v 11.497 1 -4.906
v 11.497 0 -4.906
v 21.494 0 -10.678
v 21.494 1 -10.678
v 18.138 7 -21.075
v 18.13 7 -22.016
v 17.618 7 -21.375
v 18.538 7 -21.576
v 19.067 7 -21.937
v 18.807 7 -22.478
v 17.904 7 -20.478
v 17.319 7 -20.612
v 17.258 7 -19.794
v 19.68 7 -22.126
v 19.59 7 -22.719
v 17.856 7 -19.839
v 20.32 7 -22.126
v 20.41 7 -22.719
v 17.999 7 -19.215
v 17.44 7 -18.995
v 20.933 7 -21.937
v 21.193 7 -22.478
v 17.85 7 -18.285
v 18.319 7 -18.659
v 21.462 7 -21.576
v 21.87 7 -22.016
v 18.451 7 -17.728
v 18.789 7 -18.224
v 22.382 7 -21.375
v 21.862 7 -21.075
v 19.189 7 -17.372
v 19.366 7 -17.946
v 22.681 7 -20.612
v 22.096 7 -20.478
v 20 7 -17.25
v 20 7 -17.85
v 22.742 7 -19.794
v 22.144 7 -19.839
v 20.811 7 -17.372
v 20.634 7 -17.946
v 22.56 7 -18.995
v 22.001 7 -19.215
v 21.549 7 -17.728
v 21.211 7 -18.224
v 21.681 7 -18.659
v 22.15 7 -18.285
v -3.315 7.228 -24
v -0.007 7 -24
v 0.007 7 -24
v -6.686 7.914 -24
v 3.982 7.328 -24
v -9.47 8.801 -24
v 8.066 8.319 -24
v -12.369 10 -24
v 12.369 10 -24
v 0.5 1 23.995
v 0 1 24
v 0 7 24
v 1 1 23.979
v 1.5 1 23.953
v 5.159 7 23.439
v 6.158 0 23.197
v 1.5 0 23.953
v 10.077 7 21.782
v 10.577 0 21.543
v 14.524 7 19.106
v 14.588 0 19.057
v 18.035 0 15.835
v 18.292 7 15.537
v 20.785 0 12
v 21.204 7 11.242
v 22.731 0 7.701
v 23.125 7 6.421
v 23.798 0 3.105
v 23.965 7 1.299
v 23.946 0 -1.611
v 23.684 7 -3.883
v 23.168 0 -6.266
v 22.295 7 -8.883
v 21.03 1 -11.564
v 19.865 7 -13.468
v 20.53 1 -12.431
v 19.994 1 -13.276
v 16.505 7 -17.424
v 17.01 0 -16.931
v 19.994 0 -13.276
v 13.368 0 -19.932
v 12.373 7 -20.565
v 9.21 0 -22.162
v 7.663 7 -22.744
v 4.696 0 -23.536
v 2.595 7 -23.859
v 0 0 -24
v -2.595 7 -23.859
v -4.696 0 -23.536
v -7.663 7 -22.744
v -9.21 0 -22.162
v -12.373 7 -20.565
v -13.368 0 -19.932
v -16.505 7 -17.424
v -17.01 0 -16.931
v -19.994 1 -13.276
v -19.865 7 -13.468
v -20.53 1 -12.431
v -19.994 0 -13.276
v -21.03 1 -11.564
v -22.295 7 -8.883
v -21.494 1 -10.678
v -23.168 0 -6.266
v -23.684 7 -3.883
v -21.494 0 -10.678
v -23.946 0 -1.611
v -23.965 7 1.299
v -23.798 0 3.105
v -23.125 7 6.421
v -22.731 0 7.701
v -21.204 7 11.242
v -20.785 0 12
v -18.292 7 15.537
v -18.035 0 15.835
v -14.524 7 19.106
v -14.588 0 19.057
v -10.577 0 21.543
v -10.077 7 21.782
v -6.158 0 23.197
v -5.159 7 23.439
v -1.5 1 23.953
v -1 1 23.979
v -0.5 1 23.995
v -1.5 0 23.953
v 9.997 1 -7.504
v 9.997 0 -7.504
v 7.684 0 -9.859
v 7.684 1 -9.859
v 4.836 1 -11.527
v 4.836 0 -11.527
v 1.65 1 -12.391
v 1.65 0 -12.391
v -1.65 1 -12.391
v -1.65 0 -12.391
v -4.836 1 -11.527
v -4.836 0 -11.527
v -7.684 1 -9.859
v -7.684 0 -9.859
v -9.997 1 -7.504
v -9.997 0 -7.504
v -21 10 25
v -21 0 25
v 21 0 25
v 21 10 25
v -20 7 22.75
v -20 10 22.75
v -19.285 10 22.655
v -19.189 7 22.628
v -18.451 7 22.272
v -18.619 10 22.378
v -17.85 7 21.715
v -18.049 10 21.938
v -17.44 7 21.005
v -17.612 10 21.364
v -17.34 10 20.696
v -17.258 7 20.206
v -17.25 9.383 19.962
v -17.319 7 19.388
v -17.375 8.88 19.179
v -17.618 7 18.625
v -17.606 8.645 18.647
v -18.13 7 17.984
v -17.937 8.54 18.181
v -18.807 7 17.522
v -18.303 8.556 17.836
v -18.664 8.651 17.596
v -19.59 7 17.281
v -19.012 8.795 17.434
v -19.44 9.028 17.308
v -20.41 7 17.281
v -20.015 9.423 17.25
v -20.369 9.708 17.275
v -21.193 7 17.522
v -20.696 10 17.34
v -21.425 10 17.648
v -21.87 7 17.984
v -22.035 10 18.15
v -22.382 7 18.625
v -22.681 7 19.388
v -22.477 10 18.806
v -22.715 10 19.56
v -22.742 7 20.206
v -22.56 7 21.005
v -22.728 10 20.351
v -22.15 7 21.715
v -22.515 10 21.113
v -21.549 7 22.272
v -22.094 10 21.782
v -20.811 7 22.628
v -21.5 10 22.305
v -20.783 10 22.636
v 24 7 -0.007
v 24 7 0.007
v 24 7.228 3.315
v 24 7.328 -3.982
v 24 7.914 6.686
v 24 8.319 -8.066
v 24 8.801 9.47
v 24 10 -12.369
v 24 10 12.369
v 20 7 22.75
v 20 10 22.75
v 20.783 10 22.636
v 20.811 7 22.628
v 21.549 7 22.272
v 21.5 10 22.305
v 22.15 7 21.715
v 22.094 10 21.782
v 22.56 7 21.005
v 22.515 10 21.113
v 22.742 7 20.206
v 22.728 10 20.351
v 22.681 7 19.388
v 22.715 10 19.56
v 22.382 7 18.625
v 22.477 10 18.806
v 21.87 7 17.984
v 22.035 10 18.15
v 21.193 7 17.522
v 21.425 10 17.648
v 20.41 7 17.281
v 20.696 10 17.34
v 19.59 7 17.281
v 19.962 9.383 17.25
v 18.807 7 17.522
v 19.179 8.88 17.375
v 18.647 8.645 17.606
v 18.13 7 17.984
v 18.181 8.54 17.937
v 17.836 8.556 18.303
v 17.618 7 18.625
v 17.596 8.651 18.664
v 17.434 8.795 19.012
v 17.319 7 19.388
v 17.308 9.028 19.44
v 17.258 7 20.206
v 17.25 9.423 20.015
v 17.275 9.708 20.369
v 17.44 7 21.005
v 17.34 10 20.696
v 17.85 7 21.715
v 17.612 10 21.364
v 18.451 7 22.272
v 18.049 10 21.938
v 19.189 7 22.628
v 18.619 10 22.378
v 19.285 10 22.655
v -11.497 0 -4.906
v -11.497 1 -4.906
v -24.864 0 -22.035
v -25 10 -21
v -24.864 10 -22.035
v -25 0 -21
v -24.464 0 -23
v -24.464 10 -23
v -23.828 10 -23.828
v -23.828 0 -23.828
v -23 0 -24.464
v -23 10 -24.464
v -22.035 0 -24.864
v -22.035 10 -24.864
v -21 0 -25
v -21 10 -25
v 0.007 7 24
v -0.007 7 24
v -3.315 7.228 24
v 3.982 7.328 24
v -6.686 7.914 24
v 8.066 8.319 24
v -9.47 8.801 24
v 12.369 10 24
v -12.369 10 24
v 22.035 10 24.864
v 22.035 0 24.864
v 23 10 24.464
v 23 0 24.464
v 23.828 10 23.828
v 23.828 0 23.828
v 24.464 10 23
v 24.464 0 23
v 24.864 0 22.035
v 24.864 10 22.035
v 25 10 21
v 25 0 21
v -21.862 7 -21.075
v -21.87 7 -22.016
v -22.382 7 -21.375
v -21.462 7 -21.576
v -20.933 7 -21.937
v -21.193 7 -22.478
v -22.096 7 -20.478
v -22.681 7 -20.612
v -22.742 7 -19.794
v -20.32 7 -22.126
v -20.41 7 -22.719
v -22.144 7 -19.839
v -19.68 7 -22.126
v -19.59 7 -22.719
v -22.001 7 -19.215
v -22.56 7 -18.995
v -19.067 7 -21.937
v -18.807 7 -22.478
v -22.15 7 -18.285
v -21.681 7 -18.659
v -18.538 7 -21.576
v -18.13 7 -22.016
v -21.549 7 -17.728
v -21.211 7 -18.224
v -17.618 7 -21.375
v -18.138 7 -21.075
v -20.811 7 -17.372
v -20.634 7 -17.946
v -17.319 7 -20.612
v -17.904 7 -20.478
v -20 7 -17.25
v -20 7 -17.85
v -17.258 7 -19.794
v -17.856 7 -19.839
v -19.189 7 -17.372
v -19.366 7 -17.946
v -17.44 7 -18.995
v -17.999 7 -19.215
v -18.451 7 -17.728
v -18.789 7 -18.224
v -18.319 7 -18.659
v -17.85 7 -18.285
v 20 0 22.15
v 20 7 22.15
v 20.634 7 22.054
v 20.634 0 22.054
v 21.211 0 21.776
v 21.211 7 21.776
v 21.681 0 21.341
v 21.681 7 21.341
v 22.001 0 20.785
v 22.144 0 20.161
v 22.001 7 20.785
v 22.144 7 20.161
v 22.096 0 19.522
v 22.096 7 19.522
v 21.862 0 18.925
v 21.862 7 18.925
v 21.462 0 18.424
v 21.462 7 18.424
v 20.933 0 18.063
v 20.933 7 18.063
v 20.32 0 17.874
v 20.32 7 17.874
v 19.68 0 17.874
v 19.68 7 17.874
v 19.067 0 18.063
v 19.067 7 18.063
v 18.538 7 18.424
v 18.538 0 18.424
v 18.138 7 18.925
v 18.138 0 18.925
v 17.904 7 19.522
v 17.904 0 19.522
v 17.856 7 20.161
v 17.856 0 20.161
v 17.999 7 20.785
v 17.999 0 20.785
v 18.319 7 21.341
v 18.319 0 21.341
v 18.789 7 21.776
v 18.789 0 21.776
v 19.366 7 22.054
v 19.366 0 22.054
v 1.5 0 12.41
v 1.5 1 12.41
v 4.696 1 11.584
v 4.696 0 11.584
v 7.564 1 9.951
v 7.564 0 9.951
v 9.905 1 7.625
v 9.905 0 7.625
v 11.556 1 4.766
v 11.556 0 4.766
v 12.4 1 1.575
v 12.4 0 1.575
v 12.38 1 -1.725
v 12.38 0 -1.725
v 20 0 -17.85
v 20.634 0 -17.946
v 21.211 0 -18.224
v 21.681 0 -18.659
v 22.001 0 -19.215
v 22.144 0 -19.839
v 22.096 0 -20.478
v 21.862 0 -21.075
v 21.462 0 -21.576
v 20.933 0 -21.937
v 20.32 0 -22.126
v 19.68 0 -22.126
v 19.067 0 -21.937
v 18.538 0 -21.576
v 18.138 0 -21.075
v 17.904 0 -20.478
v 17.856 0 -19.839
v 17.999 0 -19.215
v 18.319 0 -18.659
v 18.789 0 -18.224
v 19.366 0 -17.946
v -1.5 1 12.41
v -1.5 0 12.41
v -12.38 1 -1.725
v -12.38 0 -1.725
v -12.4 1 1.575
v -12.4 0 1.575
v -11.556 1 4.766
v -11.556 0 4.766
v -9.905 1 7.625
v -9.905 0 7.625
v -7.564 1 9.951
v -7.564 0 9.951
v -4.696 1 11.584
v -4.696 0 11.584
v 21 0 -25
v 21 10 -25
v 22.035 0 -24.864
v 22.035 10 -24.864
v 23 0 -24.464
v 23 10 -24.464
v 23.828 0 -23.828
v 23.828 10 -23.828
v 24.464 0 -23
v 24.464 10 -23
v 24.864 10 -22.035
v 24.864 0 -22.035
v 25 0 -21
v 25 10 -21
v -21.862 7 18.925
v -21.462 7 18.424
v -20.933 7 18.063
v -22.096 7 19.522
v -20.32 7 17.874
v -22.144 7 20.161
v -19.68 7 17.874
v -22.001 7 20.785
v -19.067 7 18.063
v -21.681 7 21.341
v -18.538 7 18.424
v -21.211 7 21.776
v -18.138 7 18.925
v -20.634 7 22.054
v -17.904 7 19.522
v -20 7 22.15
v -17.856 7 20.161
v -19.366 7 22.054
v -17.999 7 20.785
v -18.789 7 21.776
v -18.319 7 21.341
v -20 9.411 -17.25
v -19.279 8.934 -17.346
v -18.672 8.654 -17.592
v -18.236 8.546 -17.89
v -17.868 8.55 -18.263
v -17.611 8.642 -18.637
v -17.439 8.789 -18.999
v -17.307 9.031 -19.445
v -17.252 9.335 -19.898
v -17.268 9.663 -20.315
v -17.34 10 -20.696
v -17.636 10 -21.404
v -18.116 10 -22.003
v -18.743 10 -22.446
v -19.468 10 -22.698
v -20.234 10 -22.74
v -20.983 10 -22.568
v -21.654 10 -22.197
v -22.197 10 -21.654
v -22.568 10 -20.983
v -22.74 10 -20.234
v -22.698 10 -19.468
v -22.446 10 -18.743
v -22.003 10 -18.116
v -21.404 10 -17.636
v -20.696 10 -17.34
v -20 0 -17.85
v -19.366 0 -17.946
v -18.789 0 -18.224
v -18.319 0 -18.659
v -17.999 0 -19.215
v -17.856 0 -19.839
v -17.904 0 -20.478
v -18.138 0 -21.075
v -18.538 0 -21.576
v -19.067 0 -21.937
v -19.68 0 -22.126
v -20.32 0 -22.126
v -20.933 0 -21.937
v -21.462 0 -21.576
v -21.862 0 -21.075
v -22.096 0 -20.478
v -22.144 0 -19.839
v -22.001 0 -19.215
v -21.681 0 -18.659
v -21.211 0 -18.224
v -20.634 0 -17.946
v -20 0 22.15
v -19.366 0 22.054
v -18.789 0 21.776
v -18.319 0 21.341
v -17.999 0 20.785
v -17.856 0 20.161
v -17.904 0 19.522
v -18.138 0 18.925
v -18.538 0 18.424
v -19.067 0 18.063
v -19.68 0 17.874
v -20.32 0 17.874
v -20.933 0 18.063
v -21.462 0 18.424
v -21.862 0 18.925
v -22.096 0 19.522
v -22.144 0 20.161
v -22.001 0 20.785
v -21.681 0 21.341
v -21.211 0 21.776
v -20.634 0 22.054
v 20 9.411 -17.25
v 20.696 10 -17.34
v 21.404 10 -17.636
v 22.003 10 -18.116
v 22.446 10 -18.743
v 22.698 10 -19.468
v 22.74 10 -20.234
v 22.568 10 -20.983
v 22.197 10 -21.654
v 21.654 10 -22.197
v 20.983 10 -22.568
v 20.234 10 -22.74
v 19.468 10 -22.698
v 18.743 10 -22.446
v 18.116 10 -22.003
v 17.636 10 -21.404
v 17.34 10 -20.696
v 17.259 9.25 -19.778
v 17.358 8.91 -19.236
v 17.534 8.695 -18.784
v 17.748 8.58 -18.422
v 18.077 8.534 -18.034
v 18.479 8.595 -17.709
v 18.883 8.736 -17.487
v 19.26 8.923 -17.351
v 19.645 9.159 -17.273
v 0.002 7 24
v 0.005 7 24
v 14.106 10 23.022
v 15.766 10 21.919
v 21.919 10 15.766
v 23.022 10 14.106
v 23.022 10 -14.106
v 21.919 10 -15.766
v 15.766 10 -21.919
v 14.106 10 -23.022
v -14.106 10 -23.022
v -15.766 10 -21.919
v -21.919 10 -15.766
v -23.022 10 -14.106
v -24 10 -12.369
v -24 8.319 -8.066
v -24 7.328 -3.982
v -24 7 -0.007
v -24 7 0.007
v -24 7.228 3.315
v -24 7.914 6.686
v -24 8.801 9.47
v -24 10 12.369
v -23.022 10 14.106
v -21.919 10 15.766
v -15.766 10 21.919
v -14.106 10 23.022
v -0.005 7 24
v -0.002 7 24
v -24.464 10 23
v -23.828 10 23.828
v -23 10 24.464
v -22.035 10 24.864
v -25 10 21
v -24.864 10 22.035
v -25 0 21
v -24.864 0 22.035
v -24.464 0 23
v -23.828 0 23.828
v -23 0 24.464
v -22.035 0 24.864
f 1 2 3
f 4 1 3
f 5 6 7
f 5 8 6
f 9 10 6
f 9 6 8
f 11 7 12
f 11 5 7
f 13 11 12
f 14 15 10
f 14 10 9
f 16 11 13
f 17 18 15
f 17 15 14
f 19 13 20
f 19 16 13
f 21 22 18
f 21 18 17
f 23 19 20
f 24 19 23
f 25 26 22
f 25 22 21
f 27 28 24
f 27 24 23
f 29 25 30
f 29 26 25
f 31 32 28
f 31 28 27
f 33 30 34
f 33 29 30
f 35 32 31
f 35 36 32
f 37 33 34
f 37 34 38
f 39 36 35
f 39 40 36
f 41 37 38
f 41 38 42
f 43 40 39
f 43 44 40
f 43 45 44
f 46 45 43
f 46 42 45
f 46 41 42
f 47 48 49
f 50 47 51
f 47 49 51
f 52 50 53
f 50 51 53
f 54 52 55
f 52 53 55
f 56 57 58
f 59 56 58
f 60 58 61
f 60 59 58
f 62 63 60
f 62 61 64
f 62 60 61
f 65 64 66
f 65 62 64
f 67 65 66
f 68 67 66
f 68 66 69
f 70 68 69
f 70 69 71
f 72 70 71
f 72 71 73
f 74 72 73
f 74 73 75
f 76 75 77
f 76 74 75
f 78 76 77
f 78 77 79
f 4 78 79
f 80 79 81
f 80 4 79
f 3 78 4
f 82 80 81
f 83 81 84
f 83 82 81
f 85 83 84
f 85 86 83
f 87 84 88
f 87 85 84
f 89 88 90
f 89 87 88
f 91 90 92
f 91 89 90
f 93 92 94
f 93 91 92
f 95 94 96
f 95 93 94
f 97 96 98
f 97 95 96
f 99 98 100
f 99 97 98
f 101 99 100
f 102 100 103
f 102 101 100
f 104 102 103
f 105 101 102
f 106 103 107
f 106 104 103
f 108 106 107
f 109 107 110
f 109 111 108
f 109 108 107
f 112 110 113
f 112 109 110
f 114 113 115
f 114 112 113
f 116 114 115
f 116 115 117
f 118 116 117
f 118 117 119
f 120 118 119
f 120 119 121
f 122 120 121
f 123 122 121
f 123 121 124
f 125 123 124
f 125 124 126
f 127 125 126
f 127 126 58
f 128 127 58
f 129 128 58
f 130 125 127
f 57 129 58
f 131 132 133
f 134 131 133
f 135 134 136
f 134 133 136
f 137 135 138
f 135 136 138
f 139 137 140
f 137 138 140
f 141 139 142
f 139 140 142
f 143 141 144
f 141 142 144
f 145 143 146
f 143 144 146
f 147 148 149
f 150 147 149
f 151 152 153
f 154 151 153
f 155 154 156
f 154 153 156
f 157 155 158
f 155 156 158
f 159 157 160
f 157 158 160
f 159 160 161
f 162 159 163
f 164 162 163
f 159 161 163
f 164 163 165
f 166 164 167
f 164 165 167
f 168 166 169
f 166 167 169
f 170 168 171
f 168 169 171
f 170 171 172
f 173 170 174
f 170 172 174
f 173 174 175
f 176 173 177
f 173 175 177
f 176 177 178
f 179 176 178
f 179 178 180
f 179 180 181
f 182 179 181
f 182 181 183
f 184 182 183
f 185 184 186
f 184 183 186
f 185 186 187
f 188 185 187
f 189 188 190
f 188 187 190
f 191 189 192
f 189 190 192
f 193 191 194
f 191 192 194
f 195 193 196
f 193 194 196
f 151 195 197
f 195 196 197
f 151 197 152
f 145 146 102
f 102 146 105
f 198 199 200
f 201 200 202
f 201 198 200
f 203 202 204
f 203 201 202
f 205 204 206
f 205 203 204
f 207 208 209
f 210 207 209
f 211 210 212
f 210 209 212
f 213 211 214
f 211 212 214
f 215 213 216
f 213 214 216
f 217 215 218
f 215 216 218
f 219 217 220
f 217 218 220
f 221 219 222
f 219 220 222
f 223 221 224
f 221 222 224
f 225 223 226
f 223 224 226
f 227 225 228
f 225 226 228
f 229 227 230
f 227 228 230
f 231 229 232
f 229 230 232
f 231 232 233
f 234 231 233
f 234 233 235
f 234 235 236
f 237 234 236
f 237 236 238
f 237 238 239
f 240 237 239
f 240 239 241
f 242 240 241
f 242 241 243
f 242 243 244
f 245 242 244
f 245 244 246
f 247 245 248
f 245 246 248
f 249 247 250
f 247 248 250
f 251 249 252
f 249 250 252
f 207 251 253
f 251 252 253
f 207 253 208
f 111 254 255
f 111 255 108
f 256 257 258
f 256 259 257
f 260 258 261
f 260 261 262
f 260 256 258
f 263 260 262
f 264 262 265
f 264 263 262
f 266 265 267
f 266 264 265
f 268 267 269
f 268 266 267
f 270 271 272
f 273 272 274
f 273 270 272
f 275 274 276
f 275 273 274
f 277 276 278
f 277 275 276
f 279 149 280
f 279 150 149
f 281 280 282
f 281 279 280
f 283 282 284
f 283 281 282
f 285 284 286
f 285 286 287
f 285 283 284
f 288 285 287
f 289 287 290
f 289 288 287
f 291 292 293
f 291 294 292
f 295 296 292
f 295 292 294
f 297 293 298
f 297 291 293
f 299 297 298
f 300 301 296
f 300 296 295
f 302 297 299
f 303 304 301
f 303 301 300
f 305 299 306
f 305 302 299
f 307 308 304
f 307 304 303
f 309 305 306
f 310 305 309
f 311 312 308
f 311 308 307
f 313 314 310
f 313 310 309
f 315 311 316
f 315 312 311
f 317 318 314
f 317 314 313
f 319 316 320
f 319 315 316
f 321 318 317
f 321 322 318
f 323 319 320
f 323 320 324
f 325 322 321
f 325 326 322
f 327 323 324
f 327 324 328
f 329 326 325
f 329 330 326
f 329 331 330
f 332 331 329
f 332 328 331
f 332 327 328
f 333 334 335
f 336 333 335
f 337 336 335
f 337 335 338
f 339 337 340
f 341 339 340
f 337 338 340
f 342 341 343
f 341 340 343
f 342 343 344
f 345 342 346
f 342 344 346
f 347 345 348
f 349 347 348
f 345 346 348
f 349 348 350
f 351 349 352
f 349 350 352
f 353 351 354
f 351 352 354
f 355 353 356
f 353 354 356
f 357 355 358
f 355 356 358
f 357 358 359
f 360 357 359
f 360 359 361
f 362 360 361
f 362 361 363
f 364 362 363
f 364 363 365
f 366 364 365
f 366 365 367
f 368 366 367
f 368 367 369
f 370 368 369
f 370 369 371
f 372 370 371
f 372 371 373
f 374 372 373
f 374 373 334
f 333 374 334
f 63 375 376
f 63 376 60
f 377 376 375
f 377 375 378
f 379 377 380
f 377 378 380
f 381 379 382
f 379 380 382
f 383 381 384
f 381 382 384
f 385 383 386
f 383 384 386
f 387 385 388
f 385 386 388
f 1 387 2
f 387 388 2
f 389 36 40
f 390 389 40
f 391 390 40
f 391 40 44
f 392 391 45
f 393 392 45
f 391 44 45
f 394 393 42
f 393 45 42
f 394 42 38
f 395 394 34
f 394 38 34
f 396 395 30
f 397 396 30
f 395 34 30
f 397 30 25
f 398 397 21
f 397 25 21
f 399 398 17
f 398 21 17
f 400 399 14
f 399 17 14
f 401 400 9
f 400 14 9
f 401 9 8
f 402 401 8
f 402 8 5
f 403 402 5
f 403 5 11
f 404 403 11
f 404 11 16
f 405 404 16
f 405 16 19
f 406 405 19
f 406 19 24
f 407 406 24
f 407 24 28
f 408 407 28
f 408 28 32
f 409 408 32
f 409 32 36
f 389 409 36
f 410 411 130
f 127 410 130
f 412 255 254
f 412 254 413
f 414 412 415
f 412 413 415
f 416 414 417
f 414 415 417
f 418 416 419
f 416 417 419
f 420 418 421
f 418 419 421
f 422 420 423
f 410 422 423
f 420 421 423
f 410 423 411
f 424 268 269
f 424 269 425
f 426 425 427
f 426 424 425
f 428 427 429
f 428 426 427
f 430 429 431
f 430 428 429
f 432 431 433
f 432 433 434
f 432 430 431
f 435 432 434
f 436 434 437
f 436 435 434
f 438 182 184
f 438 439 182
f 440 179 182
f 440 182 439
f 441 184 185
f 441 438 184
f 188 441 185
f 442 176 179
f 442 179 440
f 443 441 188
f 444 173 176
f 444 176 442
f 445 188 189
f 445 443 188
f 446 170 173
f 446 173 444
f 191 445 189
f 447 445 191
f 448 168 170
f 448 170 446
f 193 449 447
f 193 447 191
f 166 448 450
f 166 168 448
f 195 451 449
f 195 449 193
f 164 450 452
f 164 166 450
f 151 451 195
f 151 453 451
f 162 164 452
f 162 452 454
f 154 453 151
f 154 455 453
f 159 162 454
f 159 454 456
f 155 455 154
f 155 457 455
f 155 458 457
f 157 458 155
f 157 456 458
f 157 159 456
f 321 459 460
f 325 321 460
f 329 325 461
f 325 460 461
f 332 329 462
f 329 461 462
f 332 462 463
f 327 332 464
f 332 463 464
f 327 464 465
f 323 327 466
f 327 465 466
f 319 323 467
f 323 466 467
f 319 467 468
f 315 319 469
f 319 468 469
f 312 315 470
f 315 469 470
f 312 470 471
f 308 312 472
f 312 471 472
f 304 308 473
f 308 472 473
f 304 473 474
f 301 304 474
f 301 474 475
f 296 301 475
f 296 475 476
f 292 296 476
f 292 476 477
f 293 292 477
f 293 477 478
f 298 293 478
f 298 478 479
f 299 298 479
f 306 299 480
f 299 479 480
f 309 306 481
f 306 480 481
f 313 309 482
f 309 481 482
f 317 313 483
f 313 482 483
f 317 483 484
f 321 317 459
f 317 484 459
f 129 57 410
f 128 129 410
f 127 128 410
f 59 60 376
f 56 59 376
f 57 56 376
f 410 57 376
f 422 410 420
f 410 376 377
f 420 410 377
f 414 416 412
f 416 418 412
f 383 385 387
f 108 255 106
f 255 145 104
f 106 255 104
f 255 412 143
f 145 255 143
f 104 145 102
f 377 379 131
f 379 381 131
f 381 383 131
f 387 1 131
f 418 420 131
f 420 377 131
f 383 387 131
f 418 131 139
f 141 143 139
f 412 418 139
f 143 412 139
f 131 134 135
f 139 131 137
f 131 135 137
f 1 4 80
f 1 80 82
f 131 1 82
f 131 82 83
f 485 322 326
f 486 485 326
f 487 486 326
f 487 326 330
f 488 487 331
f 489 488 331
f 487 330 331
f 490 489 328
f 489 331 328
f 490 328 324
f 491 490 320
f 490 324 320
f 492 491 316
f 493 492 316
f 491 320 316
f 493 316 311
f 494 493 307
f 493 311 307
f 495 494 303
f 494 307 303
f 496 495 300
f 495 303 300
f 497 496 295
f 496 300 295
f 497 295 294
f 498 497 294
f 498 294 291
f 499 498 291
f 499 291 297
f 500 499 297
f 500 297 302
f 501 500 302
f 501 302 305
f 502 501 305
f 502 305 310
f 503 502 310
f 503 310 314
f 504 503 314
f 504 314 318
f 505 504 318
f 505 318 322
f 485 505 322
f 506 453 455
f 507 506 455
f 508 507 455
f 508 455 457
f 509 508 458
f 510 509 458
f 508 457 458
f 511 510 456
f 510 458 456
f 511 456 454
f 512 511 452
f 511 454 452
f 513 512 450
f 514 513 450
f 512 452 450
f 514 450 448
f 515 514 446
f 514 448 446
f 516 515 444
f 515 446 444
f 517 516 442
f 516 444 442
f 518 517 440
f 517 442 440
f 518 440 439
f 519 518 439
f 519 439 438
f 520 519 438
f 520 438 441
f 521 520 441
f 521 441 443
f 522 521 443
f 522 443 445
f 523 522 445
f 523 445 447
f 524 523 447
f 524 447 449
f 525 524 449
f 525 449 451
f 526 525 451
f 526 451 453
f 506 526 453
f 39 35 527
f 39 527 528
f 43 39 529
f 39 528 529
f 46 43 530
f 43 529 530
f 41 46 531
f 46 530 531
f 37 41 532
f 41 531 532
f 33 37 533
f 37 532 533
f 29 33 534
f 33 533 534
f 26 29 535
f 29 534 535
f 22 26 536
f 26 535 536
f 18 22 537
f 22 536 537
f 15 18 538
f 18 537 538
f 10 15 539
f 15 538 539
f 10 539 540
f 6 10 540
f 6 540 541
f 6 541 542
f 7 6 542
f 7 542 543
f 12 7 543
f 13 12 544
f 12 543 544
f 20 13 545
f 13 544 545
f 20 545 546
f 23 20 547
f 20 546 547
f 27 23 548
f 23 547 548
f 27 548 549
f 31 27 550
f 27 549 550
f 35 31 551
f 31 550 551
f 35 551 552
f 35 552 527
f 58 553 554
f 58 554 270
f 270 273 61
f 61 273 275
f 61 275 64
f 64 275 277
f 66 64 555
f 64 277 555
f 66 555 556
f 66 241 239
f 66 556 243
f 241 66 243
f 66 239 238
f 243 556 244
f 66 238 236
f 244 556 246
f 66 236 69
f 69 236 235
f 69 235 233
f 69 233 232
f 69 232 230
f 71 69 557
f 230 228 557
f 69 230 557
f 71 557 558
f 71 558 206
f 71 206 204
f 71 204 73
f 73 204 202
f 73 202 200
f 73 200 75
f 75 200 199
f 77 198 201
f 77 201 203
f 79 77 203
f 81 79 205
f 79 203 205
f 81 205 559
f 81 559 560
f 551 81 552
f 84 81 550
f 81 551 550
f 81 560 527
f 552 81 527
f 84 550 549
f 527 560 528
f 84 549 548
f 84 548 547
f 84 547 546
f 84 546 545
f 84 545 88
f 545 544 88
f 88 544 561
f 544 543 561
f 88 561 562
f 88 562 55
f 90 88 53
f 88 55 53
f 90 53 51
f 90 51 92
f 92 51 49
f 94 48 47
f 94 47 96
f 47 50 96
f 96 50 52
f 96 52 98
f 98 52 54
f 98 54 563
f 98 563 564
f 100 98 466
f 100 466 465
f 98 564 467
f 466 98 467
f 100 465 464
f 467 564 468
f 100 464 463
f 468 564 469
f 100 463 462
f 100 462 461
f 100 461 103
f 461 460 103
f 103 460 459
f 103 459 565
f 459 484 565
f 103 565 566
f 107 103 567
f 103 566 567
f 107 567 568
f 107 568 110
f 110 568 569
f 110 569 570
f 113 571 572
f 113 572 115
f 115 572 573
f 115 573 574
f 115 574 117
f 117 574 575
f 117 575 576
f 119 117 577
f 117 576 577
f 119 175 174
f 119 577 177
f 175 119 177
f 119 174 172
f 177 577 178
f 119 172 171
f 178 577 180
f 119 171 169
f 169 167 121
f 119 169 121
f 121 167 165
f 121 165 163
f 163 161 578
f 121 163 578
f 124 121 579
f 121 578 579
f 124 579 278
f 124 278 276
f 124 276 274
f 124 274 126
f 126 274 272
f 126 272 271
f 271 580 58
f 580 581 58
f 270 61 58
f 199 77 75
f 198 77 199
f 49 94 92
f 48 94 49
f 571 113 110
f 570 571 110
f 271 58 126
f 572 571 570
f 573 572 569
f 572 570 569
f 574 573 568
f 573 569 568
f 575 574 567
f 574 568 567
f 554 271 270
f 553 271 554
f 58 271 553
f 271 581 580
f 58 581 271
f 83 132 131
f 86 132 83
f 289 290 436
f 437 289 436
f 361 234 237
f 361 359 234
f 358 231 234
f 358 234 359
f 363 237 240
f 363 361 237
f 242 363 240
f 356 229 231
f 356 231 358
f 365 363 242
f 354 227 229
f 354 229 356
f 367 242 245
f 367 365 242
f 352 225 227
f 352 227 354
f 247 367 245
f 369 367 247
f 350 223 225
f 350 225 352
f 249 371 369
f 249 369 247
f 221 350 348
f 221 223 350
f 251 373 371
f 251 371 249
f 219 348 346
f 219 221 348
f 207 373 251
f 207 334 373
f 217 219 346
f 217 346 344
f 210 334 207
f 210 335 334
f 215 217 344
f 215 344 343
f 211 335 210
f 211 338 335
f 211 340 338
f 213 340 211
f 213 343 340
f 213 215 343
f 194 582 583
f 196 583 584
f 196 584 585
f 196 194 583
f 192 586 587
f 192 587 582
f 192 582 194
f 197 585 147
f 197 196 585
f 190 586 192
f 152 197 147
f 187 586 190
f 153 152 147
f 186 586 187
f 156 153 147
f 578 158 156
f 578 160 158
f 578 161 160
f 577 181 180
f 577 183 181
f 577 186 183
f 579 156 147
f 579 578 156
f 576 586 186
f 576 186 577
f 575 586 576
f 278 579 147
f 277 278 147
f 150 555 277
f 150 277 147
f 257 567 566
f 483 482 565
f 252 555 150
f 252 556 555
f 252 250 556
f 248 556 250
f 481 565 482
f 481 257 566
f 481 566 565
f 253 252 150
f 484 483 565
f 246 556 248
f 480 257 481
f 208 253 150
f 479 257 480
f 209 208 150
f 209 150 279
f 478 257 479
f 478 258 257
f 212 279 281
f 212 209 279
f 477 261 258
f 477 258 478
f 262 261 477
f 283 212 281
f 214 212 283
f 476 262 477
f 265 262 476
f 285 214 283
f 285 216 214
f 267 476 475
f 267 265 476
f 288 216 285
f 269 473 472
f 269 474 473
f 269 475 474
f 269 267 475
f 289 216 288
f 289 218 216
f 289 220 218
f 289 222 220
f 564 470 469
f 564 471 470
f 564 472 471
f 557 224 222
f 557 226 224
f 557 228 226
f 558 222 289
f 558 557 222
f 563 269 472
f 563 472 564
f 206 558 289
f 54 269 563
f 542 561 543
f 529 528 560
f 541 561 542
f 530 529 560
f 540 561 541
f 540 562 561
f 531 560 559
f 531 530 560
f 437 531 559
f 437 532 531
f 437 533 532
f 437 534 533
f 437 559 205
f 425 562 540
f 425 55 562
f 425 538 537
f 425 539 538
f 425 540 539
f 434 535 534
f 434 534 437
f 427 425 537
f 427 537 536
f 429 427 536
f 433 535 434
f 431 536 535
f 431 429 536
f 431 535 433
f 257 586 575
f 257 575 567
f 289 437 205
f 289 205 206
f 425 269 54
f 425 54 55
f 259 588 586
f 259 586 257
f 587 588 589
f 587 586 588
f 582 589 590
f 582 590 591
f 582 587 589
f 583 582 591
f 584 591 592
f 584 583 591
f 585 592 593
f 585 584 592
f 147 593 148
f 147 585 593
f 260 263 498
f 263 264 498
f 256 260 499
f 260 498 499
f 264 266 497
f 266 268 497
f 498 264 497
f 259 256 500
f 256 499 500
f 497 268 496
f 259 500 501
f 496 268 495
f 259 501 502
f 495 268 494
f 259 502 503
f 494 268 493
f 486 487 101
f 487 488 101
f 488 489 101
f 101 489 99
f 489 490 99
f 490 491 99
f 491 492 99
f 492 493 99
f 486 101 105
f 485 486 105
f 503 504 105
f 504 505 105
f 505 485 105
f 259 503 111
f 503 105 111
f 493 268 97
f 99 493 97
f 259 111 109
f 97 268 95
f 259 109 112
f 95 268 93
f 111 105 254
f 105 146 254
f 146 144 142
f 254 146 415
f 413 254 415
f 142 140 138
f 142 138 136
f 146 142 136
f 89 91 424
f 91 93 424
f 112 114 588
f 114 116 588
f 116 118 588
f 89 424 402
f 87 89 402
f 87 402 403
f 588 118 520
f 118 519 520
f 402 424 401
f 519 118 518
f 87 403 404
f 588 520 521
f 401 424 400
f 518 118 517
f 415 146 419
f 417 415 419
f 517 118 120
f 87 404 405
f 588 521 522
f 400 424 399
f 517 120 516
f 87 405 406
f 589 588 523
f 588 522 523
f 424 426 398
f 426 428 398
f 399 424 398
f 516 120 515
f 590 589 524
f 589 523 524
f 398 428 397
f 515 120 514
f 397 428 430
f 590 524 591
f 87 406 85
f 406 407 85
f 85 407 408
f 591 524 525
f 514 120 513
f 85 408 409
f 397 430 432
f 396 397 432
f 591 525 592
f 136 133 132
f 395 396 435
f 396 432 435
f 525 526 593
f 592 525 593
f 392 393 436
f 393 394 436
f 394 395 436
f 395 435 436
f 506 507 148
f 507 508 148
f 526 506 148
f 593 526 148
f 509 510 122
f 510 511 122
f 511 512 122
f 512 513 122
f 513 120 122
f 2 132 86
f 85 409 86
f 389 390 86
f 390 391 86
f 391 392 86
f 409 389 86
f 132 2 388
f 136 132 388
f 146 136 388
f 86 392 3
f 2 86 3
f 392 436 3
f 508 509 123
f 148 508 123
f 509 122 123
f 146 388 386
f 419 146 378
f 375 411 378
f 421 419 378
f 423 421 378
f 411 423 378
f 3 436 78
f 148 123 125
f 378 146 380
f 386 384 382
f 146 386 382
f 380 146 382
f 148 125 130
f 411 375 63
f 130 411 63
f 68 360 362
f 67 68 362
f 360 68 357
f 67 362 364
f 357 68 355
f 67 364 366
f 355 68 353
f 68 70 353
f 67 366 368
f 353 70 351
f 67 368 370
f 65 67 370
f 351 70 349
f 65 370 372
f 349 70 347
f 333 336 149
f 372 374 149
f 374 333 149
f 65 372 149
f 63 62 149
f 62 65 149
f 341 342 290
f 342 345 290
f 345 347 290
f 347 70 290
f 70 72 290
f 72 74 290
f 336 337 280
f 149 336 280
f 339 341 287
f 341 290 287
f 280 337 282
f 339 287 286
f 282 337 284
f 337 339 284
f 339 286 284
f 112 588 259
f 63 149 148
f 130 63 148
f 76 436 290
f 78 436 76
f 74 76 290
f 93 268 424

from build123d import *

# Parameters (mm, degrees)
SKETCH1_W           = 50
SKETCH1_H           = 50
SKETCH1_R           = 24
BOSS_EXTRUDE1_DEPTH = 10
CHAMFER1_SIZE       = 3
BOSS_EXTRUDE2_START = -2.999999
SKETCH4_W           = 50
SKETCH4_H           = 50
SKETCH4_W_2         = 48
SKETCH4_H_2         = 48
BOSS_EXTRUDE2_DEPTH = 2.999999
SKETCH5_R           = 2.75
CUT_EXTRUDE1_DEPTH  = 3
FILLET1_R           = 4
SKETCH6_R           = 12.5
BOSS_EXTRUDE5_DEPTH = 1
SKETCH7_R           = 2.15
CUT_EXTRUDE2_DEPTH  = 21
SKETCH9_W           = 3
SKETCH9_H           = 24
BOSS_EXTRUDE6_DEPTH = 1
CIRPATTERN1_COUNT   = 3


with BuildPart() as part:
    # Sketch1 → Boss-Extrude1 (new body)
    with BuildSketch(Plane(origin=(0, 0, 0), x_dir=(1, 0, 0), z_dir=(0, 1, 0))):
        Rectangle(SKETCH1_W, SKETCH1_H)
        with Locations(Location((0, 0, 0), (0, 0, 270))):
            Circle(SKETCH1_R, mode=Mode.SUBTRACT)
    extrude(amount=BOSS_EXTRUDE1_DEPTH)

    # Chamfer1
    # the kernel refuses this chamfer: 3 mm, written as the material it takes off along each edge
    with BuildSketch(Plane(origin=(0, 10, 0), x_dir=(0, 0, 1), z_dir=(-1, 0, 0))) as chamfer1_piece_1:
        Polygon((24, -CHAMFER1_SIZE), (24 + CHAMFER1_SIZE, 0), (24, 0), align=None)
    revolve(axis=Axis((0, 10, 0), (0, 1, 0)), mode=Mode.SUBTRACT)

    # Sketch4 → Boss-Extrude2 (add)
    with BuildSketch(Plane(origin=(0, 10, 0), x_dir=(1, 0, 0), z_dir=(0, 1, 0)).offset(BOSS_EXTRUDE2_START)):
        Rectangle(SKETCH4_W, SKETCH4_H)
        Rectangle(SKETCH4_W_2, SKETCH4_H_2, mode=Mode.SUBTRACT)
    extrude(amount=BOSS_EXTRUDE2_DEPTH)

    # Sketch5 → Cut-Extrude1 (cut)
    with BuildSketch(Plane(origin=(0, 10, 0), x_dir=(1, 0, 0), z_dir=(0, 1, 0))):
        with Locations(Location((-20, 20, 0), (0, 0, 270))):
            Circle(SKETCH5_R)
        with Locations(Location((20, 20, 0), (0, 0, 270))):
            Circle(SKETCH5_R)
        with Locations(Location((20, -20, 0), (0, 0, 270))):
            Circle(SKETCH5_R)
        with Locations(Location((-20, -20, 0), (0, 0, 270))):
            Circle(SKETCH5_R)
    extrude(amount=-CUT_EXTRUDE1_DEPTH, mode=Mode.SUBTRACT)

    # Fillet1
    fillet1_edges = [part.edges().sort_by_distance(p)[0] for p in [
        (-25, 5, -25),
        (25, 5, -25),
        (25, 5, 25),
        (-25, 5, 25),
    ]]
    fillet(fillet1_edges, radius=FILLET1_R)

    # Sketch7 → Cut-Extrude2 (cut)
    with BuildSketch(Plane(origin=(0, 7, 0), x_dir=(1, 0, 0), z_dir=(0, 1, 0))):
        with Locations(Location((-20, -20, 0), (0, 0, 270))):
            Circle(SKETCH7_R)
        with Locations(Location((-20, 20, 0), (0, 0, 270))):
            Circle(SKETCH7_R)
        with Locations(Location((20, 20, 0), (0, 0, 270))):
            Circle(SKETCH7_R)
        with Locations(Location((20, -20, 0), (0, 0, 270))):
            Circle(SKETCH7_R)
    extrude(amount=-CUT_EXTRUDE2_DEPTH, mode=Mode.SUBTRACT)



with BuildPart() as body_2:
    # Sketch6 → Boss-Extrude5 (new body)
    with BuildSketch(Plane(origin=(0, 0, 0), x_dir=(1, 0, 0), z_dir=(0, 1, 0))):
        with Locations(Location((0, 0, 0), (0, 0, 270))):
            Circle(SKETCH6_R)
    extrude(amount=BOSS_EXTRUDE5_DEPTH)


with BuildPart() as part_1:
    add(part.part)

    add(body_2.part)  # Boss-Extrude6 merges body 2
    # Sketch9 → Boss-Extrude6 (add)
    with BuildSketch(Plane.XZ):
        with Locations((0, 12.5)):
            Rectangle(SKETCH9_W, SKETCH9_H)
    boss_extrude6 = extrude(amount=-BOSS_EXTRUDE6_DEPTH)

    # CirPattern1: Boss-Extrude6 ×3 about axis
    cirpattern1_axis = Axis((0, 0, 0), (0, 1, 0))
    for i in range(1, CIRPATTERN1_COUNT):
        add(boss_extrude6.rotate(cirpattern1_axis, i * 360 / CIRPATTERN1_COUNT))


solid = part_1.part
